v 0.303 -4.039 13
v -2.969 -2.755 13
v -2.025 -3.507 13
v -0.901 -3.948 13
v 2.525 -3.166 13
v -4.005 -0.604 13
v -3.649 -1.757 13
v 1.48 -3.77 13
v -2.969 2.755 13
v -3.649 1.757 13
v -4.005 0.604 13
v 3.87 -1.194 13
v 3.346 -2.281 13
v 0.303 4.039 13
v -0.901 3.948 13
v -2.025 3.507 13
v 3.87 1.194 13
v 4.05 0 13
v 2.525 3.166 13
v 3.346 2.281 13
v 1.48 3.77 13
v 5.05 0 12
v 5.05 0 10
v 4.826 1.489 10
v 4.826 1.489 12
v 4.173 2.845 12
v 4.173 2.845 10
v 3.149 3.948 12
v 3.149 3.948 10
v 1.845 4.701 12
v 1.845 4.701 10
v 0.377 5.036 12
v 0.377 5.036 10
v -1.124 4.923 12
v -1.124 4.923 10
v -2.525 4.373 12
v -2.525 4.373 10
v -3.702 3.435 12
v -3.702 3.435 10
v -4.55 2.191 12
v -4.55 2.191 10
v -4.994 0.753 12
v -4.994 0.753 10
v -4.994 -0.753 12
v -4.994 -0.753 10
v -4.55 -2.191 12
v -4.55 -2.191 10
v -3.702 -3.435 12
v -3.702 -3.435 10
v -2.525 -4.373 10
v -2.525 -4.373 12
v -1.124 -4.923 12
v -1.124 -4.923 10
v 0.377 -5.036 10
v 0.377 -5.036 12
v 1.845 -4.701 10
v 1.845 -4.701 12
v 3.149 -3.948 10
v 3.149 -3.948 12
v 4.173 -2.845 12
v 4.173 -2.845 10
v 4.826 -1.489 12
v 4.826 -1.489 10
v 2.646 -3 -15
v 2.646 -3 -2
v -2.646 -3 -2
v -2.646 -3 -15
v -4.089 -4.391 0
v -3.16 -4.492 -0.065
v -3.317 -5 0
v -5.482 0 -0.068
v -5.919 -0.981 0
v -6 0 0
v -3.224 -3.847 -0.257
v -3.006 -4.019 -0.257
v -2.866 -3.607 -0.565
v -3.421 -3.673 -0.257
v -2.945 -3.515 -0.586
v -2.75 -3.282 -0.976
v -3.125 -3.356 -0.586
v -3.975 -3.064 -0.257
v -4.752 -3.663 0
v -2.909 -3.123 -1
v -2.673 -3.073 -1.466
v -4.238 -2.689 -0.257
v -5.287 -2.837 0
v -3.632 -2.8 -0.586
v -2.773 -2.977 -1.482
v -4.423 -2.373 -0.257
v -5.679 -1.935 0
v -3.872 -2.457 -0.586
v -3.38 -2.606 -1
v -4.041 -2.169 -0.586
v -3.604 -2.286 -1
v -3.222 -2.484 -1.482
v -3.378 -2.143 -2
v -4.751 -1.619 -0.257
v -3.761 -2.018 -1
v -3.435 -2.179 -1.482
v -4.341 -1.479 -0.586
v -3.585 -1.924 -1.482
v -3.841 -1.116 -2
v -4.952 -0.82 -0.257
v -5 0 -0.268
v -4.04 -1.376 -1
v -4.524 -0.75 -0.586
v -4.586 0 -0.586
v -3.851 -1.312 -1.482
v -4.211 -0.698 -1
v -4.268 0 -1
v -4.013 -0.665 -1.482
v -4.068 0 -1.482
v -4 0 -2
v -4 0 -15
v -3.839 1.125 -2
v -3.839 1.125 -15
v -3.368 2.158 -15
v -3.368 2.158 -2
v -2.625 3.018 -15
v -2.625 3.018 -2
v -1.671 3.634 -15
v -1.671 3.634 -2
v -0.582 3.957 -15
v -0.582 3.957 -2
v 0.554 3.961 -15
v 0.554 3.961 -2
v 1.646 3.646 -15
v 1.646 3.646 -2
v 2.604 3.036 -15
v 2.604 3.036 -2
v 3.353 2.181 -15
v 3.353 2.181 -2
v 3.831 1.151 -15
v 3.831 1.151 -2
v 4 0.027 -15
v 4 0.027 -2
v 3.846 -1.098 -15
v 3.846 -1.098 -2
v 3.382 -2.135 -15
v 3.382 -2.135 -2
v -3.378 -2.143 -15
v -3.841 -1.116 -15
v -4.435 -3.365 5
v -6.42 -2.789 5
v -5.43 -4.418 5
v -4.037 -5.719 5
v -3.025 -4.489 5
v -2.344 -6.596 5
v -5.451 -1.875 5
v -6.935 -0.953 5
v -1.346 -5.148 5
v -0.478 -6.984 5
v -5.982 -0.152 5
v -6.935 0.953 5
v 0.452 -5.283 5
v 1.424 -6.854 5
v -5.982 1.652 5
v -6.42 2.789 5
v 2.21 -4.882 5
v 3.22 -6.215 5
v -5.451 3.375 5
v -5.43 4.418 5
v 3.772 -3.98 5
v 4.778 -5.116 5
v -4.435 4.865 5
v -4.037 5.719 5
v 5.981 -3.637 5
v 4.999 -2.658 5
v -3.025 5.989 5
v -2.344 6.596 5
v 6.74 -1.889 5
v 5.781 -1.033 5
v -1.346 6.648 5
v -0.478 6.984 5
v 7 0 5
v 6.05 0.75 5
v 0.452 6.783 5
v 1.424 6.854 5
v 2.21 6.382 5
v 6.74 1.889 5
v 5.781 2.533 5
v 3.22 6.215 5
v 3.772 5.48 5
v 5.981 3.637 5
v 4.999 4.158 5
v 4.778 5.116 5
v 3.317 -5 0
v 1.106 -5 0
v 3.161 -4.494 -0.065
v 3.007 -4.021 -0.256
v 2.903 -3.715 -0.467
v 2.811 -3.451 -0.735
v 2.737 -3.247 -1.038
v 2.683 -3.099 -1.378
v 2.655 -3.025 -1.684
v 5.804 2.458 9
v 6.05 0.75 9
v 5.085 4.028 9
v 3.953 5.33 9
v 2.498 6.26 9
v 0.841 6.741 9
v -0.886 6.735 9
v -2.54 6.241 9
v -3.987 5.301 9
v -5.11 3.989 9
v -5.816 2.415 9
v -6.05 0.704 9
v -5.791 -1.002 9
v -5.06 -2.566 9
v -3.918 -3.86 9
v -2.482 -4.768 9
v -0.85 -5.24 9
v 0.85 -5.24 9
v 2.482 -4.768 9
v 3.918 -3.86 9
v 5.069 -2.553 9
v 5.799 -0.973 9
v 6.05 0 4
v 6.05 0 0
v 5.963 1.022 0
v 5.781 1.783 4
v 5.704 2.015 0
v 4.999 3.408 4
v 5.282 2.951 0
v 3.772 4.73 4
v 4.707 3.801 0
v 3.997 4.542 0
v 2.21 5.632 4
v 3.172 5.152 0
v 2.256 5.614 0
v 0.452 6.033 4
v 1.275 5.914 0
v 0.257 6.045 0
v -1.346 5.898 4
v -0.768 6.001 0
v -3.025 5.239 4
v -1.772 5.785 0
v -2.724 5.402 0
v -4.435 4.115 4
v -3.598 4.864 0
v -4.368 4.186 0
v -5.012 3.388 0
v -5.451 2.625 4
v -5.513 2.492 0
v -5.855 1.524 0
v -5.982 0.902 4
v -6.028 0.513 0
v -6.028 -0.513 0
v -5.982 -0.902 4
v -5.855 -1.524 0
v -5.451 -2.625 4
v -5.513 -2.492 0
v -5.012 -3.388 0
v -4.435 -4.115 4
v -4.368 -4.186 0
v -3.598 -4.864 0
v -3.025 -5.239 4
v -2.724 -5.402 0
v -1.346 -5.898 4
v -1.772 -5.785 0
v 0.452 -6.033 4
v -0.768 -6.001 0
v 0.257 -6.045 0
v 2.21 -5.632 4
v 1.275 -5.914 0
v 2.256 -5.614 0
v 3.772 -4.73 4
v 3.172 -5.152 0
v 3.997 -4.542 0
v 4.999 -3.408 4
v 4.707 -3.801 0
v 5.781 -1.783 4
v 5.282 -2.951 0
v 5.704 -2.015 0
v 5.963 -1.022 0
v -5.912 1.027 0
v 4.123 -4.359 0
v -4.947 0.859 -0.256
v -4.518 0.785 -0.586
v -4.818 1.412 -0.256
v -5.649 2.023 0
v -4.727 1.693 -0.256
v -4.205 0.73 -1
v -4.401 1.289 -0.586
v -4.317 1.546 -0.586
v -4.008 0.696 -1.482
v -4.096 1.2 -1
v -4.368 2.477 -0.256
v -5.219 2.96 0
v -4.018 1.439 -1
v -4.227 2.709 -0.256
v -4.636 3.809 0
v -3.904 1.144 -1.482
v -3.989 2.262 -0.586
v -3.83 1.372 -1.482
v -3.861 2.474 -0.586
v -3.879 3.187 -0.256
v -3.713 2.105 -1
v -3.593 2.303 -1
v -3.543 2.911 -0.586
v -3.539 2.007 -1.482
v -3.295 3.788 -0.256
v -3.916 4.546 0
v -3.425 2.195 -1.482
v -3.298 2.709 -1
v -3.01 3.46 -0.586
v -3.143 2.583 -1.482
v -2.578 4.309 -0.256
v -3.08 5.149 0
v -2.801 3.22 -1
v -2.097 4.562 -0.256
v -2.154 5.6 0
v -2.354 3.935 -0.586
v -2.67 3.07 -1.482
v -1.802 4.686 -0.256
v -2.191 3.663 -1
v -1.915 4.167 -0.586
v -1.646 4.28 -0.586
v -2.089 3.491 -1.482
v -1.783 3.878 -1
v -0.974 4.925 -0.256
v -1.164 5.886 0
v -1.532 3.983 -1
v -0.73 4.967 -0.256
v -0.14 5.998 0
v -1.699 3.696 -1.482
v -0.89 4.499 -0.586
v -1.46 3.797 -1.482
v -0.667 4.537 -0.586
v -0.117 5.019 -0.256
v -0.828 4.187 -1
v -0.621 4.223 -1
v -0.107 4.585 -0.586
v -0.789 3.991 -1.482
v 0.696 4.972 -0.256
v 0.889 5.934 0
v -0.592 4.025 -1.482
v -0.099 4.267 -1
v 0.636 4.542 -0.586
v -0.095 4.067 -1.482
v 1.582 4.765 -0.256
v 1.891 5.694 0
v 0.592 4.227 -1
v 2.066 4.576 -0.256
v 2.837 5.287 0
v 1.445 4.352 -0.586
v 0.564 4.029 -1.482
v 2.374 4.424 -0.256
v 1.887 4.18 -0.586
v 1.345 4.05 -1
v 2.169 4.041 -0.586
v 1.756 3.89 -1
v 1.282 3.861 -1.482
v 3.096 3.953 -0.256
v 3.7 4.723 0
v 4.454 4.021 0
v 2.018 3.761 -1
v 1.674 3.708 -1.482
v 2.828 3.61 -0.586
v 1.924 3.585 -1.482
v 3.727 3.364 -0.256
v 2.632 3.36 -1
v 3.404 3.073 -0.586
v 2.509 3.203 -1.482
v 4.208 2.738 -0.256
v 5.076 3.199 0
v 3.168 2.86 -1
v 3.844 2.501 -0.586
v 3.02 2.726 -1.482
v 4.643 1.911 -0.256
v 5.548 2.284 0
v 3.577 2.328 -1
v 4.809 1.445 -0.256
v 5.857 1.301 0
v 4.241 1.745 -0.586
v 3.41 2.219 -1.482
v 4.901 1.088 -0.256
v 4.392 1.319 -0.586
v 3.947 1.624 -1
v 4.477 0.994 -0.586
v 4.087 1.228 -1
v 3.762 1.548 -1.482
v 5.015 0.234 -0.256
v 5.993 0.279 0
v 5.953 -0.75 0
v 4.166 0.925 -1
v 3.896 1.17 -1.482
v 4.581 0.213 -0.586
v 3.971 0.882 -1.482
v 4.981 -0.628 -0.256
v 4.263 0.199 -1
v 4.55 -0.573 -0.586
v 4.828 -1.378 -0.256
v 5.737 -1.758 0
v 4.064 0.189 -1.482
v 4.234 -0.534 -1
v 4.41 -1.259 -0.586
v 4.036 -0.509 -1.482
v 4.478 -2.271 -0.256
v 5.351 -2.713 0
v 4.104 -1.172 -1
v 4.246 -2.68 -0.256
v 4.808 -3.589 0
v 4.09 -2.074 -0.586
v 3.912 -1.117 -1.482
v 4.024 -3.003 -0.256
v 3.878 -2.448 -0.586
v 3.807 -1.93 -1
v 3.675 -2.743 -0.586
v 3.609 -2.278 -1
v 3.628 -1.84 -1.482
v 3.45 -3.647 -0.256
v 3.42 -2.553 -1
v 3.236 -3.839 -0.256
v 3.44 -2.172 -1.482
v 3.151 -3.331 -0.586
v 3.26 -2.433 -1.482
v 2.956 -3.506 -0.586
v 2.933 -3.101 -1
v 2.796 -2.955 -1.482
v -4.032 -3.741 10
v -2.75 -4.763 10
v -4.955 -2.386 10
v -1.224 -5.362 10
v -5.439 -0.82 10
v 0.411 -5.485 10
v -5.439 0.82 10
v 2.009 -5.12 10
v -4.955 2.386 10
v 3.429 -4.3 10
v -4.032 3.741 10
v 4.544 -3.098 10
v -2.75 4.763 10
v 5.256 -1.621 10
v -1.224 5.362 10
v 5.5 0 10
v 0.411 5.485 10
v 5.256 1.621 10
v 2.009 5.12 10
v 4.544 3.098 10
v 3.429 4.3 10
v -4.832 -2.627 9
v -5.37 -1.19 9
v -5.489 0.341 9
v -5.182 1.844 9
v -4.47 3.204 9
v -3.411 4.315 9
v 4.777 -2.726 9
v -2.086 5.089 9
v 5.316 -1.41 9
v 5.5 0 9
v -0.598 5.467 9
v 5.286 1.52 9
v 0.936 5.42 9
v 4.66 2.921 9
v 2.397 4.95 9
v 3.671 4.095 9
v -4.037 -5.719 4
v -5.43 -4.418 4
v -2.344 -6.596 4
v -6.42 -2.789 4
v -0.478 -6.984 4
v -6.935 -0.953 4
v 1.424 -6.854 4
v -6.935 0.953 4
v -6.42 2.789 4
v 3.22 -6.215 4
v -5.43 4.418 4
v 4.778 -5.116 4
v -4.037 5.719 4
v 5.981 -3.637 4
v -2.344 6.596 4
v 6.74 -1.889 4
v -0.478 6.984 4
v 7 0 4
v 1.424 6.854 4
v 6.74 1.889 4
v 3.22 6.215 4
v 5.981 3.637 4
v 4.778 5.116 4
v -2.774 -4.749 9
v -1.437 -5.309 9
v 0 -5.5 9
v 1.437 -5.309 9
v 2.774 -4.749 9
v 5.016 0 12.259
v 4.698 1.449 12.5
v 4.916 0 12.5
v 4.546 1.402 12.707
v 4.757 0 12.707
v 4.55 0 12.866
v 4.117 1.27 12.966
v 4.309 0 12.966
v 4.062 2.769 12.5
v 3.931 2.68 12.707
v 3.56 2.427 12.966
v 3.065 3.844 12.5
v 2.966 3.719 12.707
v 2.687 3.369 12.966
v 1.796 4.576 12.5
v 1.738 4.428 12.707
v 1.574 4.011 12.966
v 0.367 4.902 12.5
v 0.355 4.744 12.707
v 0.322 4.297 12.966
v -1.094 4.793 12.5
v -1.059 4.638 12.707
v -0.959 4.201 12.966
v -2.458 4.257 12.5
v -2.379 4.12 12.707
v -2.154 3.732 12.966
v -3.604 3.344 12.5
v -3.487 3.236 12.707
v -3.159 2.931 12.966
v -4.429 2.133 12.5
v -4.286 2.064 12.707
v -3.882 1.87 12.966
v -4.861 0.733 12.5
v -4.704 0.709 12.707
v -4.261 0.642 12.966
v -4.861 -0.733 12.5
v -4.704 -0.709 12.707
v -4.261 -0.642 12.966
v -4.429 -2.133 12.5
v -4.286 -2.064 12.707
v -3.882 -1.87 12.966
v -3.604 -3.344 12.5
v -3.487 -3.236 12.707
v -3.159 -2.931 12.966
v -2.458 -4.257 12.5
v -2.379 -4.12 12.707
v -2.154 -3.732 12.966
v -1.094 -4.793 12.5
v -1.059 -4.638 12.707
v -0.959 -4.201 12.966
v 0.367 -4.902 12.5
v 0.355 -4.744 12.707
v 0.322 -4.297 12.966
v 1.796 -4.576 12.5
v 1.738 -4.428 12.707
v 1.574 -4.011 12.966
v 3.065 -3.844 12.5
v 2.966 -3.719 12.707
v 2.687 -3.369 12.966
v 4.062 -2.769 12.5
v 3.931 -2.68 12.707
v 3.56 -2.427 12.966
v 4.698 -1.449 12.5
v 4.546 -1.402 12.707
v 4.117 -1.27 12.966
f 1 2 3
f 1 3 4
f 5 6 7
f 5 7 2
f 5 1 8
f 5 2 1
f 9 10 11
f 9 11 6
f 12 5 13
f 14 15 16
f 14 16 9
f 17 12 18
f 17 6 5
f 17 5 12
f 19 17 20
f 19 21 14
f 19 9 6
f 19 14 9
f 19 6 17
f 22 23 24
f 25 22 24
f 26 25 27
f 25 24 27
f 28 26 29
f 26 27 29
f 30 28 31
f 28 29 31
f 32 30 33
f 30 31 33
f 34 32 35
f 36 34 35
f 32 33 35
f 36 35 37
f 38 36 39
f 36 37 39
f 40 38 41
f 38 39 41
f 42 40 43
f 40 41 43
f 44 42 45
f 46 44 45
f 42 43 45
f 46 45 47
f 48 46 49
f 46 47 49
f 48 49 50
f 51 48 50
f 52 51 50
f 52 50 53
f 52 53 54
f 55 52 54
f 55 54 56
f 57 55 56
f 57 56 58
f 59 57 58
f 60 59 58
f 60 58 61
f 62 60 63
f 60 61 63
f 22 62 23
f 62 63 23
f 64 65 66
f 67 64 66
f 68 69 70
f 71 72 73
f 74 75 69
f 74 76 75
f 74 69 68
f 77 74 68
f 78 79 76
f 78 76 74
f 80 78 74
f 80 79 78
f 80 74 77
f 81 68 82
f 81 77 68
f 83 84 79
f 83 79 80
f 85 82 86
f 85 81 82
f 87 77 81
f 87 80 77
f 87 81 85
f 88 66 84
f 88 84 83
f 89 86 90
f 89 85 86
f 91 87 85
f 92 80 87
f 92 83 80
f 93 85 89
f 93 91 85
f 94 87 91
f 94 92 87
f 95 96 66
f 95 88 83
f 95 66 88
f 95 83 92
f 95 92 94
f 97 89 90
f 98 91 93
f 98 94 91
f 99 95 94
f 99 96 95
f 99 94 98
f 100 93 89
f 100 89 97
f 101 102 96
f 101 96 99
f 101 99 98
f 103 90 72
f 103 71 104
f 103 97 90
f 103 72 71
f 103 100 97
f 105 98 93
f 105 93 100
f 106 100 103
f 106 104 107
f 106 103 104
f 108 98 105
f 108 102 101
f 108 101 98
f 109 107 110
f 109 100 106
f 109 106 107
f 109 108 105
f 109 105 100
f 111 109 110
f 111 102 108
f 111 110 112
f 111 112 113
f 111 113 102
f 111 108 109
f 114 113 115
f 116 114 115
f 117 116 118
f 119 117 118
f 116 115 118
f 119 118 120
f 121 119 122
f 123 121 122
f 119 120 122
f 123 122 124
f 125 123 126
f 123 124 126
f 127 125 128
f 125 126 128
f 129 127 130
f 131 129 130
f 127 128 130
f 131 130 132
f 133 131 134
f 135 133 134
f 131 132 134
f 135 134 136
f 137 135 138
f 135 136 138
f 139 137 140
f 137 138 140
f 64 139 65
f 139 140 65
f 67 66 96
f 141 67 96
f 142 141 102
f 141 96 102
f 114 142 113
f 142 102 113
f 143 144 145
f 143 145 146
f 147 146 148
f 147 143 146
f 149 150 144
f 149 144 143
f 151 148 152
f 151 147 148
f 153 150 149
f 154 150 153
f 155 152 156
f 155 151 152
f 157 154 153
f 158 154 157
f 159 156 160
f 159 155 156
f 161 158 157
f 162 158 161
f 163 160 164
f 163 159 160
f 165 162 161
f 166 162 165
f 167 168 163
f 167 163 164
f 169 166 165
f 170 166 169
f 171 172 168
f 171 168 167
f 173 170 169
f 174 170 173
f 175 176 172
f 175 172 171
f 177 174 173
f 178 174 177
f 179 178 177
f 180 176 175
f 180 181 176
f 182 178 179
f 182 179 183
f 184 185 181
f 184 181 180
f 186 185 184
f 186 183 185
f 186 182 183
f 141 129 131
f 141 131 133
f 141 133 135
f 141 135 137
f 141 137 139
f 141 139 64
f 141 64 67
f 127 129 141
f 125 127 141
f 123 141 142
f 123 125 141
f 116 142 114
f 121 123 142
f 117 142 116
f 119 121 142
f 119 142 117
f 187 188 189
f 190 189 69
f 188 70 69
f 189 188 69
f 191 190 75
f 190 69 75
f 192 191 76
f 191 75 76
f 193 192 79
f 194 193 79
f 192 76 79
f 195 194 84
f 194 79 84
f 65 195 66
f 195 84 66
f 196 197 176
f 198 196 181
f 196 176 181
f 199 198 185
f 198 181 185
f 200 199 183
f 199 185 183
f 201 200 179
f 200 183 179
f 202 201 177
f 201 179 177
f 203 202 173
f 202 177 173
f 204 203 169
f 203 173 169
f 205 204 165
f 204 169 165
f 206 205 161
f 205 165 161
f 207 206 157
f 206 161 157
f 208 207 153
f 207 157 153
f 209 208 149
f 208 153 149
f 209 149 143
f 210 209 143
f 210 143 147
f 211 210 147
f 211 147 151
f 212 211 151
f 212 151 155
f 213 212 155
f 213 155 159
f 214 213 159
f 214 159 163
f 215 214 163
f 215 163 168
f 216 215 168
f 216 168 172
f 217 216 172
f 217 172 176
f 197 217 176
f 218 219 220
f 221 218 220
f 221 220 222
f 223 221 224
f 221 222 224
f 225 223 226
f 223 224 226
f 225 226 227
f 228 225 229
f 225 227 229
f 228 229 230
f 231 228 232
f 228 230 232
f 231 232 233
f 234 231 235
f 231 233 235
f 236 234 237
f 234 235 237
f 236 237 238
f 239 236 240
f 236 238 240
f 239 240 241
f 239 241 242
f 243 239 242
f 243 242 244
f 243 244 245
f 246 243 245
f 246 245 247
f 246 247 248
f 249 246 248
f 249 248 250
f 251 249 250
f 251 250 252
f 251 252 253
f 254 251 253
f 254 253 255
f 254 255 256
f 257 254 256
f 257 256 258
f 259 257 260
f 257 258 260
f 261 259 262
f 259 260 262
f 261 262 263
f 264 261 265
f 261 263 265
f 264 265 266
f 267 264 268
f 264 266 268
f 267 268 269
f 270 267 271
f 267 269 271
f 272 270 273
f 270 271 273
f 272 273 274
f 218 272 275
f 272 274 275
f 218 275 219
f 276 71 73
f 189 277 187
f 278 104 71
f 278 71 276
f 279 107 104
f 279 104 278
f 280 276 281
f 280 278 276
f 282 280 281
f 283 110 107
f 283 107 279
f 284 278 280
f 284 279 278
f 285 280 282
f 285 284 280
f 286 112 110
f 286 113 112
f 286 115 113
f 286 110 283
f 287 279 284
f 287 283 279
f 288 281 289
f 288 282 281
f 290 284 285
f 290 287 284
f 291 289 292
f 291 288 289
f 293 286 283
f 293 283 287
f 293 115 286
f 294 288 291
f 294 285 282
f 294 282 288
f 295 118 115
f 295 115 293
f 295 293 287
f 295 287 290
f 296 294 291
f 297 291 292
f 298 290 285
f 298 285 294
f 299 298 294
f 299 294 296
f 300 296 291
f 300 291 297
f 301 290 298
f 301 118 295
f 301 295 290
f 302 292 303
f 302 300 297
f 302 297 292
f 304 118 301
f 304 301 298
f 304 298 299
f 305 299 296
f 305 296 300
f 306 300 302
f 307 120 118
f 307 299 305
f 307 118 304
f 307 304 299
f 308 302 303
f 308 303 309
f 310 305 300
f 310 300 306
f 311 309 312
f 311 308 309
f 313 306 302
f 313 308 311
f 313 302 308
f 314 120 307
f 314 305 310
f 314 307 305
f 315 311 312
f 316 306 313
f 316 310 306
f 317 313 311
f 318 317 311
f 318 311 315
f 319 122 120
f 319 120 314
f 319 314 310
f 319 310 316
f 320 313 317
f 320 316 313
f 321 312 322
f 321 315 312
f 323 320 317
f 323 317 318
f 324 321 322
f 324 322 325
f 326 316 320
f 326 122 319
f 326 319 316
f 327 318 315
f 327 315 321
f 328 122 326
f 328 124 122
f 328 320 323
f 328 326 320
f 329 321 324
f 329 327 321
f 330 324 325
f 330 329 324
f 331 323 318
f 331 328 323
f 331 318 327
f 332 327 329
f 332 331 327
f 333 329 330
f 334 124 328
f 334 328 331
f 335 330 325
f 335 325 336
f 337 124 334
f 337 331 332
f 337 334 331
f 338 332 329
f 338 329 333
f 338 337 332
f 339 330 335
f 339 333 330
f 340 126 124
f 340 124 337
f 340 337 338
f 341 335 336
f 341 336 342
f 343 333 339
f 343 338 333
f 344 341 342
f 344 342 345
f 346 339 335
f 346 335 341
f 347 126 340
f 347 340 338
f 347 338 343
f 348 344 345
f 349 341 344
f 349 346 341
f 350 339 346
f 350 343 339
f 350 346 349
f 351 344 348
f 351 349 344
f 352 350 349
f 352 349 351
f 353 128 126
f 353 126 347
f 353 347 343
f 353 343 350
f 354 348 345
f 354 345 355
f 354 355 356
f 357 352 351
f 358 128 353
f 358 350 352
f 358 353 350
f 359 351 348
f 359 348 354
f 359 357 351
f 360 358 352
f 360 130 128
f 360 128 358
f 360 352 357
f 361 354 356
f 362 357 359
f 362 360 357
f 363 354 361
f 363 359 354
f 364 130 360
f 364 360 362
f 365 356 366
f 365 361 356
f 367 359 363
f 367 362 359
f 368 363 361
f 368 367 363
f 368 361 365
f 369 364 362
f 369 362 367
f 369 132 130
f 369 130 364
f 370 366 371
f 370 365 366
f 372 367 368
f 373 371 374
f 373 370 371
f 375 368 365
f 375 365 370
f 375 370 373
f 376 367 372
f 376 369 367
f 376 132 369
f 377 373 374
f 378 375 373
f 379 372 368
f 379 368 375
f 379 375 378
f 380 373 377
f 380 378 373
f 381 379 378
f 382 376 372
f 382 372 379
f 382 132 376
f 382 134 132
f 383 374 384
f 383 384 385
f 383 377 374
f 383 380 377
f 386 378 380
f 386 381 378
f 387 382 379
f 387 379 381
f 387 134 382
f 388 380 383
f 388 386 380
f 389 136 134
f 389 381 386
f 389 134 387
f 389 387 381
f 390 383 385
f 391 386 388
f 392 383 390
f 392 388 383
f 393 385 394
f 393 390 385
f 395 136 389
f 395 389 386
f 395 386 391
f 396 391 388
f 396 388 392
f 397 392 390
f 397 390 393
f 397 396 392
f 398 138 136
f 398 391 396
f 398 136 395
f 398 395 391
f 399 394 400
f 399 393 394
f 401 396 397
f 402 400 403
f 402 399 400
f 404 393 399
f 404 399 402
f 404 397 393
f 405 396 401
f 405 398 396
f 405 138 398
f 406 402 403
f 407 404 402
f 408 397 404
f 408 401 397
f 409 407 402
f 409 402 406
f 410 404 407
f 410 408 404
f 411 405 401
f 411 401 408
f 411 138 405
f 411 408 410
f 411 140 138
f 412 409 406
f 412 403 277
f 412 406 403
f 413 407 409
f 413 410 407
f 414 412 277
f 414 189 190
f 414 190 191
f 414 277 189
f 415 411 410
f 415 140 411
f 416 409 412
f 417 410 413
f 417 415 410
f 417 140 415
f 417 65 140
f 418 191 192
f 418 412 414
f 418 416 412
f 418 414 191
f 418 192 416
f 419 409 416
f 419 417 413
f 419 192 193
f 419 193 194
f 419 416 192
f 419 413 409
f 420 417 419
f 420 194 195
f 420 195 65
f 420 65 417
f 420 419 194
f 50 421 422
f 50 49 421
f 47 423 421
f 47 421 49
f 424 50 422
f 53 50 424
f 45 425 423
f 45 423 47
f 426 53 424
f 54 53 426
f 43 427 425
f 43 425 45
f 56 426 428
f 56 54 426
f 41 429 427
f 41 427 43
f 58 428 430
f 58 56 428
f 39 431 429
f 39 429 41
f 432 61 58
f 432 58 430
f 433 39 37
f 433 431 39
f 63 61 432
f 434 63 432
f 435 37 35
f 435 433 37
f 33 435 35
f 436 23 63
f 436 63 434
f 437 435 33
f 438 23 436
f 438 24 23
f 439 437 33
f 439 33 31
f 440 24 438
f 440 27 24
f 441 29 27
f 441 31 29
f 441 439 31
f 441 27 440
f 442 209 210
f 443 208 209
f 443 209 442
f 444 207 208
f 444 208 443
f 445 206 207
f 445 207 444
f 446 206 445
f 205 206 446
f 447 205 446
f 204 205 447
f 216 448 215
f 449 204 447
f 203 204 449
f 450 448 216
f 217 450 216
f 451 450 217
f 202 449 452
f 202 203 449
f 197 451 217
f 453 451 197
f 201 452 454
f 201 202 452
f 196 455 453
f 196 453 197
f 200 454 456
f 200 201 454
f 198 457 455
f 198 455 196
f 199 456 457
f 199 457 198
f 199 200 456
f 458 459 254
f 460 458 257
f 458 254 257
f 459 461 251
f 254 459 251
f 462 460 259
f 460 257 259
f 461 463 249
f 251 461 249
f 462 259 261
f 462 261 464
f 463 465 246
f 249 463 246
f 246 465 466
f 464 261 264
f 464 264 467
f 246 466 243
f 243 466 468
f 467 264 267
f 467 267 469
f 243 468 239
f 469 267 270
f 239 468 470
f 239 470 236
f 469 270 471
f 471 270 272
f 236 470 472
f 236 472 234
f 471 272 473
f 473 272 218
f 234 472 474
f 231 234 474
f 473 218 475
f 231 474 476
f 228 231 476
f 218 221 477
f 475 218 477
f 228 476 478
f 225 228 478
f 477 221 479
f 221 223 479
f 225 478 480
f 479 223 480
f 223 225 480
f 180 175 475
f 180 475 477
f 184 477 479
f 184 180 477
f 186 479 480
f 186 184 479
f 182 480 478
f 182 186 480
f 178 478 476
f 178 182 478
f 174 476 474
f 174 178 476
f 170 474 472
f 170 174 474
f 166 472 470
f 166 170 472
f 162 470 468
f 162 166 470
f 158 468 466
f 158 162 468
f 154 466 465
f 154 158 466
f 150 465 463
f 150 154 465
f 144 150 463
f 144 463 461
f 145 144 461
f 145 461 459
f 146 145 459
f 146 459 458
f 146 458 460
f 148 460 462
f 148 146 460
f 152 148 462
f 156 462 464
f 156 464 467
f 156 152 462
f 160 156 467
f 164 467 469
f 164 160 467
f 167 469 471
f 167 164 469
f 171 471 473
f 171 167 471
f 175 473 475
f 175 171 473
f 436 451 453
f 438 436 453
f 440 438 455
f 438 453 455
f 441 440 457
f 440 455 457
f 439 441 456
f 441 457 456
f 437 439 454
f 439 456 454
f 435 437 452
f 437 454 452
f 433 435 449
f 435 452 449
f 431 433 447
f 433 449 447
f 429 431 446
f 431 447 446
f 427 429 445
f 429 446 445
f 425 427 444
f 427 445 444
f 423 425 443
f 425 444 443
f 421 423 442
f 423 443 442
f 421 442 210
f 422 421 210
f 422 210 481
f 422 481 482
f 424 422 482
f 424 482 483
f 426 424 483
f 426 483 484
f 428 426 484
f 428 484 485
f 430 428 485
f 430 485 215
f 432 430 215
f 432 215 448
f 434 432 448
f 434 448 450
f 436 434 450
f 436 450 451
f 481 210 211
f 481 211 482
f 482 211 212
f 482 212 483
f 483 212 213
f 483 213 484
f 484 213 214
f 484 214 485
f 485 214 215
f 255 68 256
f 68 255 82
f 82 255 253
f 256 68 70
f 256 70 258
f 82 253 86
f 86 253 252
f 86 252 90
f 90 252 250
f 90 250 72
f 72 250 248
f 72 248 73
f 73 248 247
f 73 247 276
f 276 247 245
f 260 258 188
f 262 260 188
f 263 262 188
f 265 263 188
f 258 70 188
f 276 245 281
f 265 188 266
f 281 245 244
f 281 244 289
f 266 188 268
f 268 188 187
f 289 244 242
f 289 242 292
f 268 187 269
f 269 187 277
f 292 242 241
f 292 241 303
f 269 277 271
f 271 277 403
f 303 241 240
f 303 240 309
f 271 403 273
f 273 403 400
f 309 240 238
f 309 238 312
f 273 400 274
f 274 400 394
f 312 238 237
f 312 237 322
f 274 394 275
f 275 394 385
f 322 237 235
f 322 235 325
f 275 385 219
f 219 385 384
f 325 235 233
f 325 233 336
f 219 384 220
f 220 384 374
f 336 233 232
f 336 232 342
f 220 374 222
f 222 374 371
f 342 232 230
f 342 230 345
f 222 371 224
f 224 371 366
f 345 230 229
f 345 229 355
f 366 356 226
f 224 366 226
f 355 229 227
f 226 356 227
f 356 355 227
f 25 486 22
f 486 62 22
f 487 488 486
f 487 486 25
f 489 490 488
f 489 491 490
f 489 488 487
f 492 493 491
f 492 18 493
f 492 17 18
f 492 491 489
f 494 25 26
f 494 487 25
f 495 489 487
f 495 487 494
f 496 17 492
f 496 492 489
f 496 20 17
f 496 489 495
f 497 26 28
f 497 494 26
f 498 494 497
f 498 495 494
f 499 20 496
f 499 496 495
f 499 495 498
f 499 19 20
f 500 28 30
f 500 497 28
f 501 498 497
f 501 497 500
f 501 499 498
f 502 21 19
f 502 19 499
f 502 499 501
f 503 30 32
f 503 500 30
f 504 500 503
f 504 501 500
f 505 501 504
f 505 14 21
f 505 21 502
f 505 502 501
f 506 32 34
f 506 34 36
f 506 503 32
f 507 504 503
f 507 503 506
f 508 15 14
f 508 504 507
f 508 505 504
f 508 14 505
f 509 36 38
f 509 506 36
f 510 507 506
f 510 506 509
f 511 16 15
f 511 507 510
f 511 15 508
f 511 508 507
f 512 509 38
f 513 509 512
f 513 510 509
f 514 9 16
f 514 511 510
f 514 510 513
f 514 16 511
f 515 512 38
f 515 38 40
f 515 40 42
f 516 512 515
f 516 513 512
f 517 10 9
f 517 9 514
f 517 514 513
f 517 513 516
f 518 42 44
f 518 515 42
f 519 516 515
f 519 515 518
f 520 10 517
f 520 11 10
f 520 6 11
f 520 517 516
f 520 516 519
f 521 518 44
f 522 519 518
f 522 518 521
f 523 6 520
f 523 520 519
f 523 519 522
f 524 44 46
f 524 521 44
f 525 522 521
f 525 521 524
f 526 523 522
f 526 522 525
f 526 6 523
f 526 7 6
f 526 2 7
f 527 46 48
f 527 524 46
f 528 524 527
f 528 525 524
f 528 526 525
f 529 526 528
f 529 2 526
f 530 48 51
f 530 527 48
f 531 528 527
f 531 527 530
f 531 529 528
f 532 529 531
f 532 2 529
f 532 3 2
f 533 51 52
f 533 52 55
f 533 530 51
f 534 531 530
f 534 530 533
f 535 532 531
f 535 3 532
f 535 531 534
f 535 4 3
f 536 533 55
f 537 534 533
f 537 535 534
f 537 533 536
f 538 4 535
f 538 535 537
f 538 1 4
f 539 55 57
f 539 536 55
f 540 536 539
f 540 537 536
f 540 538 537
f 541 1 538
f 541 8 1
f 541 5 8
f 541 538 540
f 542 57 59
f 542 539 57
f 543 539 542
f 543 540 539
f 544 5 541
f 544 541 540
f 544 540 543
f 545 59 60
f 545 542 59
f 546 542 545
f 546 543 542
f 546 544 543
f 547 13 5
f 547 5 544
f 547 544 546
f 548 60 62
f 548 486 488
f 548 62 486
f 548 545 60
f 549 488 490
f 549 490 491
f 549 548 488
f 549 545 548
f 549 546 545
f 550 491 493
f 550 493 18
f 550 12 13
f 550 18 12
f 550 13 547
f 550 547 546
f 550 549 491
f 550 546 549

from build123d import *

# Parameters (mm, degrees)
SKETCH_1_R      = 6.05
EXTRUDE_1_DEPTH = 5
SKETCH_7_R      = 7
EXTRUDE_6_DEPTH = 1
SKETCH_2_R      = 6.05
EXTRUDE_2_DEPTH = 4
EXTRUDE_3_DEPTH = 15
FILLET_1_R      = 2
SKETCH_5_R      = 5.5
EXTRUDE_4_DEPTH = 1
SKETCH_6_R      = 5.05
EXTRUDE_5_DEPTH = 3
FILLET_2_R      = 1


with BuildPart() as part:
    # 草图1 → 凸台-拉伸1 (new body)
    with BuildSketch(Plane.XY):
        Circle(SKETCH_1_R)
    extrude(amount=EXTRUDE_1_DEPTH)

    # 草图7 → 凸台-拉伸6 (add)
    with BuildSketch(Plane.XY.offset(5)):
        Circle(SKETCH_7_R)
    extrude(amount=-EXTRUDE_6_DEPTH)

    # 草图2 → 凸台-拉伸2 (add)
    with BuildSketch(Plane.XY.offset(5)):
        with Locations((0, 0.75)):
            Circle(SKETCH_2_R)
    extrude(amount=EXTRUDE_2_DEPTH)

    # 草图4 → 凸台-拉伸3 (add)
    with BuildSketch(Plane(origin=(0, 0, 0), x_dir=(-1, 0, 0), z_dir=(0, 0, -1))):
        with BuildLine():
            ThreePointArc((4, 0), (-1.645751311, 3.645751311), (-2.645751311, -3))
            Line((-2.645751311, -3), (2.645751311, -3))
            ThreePointArc((2.645751311, -3), (3.645751311, -1.645751311), (4, 0))
        make_face()
    extrude(amount=EXTRUDE_3_DEPTH)

    # 圆角1
    fillet_1_edges = [part.edges().sort_by_distance(p)[0] for p in [
        (0, -3, 0),
        (0, 4, 0),
    ]]
    fillet(fillet_1_edges, radius=FILLET_1_R)

    # 草图5 → 凸台-拉伸4 (add)
    with BuildSketch(Plane.XY.offset(9)):
        Circle(SKETCH_5_R)
    extrude(amount=EXTRUDE_4_DEPTH)

    # 草图6 → 凸台-拉伸5 (add)
    with BuildSketch(Plane.XY.offset(10)):
        Circle(SKETCH_6_R)
    extrude(amount=EXTRUDE_5_DEPTH)

    # 圆角2
    fillet_2_edges = [part.edges().sort_by_distance(p)[0] for p in [
        (-5.05, 0, 13),
    ]]
    fillet(fillet_2_edges, radius=FILLET_2_R)


solid = part.part
